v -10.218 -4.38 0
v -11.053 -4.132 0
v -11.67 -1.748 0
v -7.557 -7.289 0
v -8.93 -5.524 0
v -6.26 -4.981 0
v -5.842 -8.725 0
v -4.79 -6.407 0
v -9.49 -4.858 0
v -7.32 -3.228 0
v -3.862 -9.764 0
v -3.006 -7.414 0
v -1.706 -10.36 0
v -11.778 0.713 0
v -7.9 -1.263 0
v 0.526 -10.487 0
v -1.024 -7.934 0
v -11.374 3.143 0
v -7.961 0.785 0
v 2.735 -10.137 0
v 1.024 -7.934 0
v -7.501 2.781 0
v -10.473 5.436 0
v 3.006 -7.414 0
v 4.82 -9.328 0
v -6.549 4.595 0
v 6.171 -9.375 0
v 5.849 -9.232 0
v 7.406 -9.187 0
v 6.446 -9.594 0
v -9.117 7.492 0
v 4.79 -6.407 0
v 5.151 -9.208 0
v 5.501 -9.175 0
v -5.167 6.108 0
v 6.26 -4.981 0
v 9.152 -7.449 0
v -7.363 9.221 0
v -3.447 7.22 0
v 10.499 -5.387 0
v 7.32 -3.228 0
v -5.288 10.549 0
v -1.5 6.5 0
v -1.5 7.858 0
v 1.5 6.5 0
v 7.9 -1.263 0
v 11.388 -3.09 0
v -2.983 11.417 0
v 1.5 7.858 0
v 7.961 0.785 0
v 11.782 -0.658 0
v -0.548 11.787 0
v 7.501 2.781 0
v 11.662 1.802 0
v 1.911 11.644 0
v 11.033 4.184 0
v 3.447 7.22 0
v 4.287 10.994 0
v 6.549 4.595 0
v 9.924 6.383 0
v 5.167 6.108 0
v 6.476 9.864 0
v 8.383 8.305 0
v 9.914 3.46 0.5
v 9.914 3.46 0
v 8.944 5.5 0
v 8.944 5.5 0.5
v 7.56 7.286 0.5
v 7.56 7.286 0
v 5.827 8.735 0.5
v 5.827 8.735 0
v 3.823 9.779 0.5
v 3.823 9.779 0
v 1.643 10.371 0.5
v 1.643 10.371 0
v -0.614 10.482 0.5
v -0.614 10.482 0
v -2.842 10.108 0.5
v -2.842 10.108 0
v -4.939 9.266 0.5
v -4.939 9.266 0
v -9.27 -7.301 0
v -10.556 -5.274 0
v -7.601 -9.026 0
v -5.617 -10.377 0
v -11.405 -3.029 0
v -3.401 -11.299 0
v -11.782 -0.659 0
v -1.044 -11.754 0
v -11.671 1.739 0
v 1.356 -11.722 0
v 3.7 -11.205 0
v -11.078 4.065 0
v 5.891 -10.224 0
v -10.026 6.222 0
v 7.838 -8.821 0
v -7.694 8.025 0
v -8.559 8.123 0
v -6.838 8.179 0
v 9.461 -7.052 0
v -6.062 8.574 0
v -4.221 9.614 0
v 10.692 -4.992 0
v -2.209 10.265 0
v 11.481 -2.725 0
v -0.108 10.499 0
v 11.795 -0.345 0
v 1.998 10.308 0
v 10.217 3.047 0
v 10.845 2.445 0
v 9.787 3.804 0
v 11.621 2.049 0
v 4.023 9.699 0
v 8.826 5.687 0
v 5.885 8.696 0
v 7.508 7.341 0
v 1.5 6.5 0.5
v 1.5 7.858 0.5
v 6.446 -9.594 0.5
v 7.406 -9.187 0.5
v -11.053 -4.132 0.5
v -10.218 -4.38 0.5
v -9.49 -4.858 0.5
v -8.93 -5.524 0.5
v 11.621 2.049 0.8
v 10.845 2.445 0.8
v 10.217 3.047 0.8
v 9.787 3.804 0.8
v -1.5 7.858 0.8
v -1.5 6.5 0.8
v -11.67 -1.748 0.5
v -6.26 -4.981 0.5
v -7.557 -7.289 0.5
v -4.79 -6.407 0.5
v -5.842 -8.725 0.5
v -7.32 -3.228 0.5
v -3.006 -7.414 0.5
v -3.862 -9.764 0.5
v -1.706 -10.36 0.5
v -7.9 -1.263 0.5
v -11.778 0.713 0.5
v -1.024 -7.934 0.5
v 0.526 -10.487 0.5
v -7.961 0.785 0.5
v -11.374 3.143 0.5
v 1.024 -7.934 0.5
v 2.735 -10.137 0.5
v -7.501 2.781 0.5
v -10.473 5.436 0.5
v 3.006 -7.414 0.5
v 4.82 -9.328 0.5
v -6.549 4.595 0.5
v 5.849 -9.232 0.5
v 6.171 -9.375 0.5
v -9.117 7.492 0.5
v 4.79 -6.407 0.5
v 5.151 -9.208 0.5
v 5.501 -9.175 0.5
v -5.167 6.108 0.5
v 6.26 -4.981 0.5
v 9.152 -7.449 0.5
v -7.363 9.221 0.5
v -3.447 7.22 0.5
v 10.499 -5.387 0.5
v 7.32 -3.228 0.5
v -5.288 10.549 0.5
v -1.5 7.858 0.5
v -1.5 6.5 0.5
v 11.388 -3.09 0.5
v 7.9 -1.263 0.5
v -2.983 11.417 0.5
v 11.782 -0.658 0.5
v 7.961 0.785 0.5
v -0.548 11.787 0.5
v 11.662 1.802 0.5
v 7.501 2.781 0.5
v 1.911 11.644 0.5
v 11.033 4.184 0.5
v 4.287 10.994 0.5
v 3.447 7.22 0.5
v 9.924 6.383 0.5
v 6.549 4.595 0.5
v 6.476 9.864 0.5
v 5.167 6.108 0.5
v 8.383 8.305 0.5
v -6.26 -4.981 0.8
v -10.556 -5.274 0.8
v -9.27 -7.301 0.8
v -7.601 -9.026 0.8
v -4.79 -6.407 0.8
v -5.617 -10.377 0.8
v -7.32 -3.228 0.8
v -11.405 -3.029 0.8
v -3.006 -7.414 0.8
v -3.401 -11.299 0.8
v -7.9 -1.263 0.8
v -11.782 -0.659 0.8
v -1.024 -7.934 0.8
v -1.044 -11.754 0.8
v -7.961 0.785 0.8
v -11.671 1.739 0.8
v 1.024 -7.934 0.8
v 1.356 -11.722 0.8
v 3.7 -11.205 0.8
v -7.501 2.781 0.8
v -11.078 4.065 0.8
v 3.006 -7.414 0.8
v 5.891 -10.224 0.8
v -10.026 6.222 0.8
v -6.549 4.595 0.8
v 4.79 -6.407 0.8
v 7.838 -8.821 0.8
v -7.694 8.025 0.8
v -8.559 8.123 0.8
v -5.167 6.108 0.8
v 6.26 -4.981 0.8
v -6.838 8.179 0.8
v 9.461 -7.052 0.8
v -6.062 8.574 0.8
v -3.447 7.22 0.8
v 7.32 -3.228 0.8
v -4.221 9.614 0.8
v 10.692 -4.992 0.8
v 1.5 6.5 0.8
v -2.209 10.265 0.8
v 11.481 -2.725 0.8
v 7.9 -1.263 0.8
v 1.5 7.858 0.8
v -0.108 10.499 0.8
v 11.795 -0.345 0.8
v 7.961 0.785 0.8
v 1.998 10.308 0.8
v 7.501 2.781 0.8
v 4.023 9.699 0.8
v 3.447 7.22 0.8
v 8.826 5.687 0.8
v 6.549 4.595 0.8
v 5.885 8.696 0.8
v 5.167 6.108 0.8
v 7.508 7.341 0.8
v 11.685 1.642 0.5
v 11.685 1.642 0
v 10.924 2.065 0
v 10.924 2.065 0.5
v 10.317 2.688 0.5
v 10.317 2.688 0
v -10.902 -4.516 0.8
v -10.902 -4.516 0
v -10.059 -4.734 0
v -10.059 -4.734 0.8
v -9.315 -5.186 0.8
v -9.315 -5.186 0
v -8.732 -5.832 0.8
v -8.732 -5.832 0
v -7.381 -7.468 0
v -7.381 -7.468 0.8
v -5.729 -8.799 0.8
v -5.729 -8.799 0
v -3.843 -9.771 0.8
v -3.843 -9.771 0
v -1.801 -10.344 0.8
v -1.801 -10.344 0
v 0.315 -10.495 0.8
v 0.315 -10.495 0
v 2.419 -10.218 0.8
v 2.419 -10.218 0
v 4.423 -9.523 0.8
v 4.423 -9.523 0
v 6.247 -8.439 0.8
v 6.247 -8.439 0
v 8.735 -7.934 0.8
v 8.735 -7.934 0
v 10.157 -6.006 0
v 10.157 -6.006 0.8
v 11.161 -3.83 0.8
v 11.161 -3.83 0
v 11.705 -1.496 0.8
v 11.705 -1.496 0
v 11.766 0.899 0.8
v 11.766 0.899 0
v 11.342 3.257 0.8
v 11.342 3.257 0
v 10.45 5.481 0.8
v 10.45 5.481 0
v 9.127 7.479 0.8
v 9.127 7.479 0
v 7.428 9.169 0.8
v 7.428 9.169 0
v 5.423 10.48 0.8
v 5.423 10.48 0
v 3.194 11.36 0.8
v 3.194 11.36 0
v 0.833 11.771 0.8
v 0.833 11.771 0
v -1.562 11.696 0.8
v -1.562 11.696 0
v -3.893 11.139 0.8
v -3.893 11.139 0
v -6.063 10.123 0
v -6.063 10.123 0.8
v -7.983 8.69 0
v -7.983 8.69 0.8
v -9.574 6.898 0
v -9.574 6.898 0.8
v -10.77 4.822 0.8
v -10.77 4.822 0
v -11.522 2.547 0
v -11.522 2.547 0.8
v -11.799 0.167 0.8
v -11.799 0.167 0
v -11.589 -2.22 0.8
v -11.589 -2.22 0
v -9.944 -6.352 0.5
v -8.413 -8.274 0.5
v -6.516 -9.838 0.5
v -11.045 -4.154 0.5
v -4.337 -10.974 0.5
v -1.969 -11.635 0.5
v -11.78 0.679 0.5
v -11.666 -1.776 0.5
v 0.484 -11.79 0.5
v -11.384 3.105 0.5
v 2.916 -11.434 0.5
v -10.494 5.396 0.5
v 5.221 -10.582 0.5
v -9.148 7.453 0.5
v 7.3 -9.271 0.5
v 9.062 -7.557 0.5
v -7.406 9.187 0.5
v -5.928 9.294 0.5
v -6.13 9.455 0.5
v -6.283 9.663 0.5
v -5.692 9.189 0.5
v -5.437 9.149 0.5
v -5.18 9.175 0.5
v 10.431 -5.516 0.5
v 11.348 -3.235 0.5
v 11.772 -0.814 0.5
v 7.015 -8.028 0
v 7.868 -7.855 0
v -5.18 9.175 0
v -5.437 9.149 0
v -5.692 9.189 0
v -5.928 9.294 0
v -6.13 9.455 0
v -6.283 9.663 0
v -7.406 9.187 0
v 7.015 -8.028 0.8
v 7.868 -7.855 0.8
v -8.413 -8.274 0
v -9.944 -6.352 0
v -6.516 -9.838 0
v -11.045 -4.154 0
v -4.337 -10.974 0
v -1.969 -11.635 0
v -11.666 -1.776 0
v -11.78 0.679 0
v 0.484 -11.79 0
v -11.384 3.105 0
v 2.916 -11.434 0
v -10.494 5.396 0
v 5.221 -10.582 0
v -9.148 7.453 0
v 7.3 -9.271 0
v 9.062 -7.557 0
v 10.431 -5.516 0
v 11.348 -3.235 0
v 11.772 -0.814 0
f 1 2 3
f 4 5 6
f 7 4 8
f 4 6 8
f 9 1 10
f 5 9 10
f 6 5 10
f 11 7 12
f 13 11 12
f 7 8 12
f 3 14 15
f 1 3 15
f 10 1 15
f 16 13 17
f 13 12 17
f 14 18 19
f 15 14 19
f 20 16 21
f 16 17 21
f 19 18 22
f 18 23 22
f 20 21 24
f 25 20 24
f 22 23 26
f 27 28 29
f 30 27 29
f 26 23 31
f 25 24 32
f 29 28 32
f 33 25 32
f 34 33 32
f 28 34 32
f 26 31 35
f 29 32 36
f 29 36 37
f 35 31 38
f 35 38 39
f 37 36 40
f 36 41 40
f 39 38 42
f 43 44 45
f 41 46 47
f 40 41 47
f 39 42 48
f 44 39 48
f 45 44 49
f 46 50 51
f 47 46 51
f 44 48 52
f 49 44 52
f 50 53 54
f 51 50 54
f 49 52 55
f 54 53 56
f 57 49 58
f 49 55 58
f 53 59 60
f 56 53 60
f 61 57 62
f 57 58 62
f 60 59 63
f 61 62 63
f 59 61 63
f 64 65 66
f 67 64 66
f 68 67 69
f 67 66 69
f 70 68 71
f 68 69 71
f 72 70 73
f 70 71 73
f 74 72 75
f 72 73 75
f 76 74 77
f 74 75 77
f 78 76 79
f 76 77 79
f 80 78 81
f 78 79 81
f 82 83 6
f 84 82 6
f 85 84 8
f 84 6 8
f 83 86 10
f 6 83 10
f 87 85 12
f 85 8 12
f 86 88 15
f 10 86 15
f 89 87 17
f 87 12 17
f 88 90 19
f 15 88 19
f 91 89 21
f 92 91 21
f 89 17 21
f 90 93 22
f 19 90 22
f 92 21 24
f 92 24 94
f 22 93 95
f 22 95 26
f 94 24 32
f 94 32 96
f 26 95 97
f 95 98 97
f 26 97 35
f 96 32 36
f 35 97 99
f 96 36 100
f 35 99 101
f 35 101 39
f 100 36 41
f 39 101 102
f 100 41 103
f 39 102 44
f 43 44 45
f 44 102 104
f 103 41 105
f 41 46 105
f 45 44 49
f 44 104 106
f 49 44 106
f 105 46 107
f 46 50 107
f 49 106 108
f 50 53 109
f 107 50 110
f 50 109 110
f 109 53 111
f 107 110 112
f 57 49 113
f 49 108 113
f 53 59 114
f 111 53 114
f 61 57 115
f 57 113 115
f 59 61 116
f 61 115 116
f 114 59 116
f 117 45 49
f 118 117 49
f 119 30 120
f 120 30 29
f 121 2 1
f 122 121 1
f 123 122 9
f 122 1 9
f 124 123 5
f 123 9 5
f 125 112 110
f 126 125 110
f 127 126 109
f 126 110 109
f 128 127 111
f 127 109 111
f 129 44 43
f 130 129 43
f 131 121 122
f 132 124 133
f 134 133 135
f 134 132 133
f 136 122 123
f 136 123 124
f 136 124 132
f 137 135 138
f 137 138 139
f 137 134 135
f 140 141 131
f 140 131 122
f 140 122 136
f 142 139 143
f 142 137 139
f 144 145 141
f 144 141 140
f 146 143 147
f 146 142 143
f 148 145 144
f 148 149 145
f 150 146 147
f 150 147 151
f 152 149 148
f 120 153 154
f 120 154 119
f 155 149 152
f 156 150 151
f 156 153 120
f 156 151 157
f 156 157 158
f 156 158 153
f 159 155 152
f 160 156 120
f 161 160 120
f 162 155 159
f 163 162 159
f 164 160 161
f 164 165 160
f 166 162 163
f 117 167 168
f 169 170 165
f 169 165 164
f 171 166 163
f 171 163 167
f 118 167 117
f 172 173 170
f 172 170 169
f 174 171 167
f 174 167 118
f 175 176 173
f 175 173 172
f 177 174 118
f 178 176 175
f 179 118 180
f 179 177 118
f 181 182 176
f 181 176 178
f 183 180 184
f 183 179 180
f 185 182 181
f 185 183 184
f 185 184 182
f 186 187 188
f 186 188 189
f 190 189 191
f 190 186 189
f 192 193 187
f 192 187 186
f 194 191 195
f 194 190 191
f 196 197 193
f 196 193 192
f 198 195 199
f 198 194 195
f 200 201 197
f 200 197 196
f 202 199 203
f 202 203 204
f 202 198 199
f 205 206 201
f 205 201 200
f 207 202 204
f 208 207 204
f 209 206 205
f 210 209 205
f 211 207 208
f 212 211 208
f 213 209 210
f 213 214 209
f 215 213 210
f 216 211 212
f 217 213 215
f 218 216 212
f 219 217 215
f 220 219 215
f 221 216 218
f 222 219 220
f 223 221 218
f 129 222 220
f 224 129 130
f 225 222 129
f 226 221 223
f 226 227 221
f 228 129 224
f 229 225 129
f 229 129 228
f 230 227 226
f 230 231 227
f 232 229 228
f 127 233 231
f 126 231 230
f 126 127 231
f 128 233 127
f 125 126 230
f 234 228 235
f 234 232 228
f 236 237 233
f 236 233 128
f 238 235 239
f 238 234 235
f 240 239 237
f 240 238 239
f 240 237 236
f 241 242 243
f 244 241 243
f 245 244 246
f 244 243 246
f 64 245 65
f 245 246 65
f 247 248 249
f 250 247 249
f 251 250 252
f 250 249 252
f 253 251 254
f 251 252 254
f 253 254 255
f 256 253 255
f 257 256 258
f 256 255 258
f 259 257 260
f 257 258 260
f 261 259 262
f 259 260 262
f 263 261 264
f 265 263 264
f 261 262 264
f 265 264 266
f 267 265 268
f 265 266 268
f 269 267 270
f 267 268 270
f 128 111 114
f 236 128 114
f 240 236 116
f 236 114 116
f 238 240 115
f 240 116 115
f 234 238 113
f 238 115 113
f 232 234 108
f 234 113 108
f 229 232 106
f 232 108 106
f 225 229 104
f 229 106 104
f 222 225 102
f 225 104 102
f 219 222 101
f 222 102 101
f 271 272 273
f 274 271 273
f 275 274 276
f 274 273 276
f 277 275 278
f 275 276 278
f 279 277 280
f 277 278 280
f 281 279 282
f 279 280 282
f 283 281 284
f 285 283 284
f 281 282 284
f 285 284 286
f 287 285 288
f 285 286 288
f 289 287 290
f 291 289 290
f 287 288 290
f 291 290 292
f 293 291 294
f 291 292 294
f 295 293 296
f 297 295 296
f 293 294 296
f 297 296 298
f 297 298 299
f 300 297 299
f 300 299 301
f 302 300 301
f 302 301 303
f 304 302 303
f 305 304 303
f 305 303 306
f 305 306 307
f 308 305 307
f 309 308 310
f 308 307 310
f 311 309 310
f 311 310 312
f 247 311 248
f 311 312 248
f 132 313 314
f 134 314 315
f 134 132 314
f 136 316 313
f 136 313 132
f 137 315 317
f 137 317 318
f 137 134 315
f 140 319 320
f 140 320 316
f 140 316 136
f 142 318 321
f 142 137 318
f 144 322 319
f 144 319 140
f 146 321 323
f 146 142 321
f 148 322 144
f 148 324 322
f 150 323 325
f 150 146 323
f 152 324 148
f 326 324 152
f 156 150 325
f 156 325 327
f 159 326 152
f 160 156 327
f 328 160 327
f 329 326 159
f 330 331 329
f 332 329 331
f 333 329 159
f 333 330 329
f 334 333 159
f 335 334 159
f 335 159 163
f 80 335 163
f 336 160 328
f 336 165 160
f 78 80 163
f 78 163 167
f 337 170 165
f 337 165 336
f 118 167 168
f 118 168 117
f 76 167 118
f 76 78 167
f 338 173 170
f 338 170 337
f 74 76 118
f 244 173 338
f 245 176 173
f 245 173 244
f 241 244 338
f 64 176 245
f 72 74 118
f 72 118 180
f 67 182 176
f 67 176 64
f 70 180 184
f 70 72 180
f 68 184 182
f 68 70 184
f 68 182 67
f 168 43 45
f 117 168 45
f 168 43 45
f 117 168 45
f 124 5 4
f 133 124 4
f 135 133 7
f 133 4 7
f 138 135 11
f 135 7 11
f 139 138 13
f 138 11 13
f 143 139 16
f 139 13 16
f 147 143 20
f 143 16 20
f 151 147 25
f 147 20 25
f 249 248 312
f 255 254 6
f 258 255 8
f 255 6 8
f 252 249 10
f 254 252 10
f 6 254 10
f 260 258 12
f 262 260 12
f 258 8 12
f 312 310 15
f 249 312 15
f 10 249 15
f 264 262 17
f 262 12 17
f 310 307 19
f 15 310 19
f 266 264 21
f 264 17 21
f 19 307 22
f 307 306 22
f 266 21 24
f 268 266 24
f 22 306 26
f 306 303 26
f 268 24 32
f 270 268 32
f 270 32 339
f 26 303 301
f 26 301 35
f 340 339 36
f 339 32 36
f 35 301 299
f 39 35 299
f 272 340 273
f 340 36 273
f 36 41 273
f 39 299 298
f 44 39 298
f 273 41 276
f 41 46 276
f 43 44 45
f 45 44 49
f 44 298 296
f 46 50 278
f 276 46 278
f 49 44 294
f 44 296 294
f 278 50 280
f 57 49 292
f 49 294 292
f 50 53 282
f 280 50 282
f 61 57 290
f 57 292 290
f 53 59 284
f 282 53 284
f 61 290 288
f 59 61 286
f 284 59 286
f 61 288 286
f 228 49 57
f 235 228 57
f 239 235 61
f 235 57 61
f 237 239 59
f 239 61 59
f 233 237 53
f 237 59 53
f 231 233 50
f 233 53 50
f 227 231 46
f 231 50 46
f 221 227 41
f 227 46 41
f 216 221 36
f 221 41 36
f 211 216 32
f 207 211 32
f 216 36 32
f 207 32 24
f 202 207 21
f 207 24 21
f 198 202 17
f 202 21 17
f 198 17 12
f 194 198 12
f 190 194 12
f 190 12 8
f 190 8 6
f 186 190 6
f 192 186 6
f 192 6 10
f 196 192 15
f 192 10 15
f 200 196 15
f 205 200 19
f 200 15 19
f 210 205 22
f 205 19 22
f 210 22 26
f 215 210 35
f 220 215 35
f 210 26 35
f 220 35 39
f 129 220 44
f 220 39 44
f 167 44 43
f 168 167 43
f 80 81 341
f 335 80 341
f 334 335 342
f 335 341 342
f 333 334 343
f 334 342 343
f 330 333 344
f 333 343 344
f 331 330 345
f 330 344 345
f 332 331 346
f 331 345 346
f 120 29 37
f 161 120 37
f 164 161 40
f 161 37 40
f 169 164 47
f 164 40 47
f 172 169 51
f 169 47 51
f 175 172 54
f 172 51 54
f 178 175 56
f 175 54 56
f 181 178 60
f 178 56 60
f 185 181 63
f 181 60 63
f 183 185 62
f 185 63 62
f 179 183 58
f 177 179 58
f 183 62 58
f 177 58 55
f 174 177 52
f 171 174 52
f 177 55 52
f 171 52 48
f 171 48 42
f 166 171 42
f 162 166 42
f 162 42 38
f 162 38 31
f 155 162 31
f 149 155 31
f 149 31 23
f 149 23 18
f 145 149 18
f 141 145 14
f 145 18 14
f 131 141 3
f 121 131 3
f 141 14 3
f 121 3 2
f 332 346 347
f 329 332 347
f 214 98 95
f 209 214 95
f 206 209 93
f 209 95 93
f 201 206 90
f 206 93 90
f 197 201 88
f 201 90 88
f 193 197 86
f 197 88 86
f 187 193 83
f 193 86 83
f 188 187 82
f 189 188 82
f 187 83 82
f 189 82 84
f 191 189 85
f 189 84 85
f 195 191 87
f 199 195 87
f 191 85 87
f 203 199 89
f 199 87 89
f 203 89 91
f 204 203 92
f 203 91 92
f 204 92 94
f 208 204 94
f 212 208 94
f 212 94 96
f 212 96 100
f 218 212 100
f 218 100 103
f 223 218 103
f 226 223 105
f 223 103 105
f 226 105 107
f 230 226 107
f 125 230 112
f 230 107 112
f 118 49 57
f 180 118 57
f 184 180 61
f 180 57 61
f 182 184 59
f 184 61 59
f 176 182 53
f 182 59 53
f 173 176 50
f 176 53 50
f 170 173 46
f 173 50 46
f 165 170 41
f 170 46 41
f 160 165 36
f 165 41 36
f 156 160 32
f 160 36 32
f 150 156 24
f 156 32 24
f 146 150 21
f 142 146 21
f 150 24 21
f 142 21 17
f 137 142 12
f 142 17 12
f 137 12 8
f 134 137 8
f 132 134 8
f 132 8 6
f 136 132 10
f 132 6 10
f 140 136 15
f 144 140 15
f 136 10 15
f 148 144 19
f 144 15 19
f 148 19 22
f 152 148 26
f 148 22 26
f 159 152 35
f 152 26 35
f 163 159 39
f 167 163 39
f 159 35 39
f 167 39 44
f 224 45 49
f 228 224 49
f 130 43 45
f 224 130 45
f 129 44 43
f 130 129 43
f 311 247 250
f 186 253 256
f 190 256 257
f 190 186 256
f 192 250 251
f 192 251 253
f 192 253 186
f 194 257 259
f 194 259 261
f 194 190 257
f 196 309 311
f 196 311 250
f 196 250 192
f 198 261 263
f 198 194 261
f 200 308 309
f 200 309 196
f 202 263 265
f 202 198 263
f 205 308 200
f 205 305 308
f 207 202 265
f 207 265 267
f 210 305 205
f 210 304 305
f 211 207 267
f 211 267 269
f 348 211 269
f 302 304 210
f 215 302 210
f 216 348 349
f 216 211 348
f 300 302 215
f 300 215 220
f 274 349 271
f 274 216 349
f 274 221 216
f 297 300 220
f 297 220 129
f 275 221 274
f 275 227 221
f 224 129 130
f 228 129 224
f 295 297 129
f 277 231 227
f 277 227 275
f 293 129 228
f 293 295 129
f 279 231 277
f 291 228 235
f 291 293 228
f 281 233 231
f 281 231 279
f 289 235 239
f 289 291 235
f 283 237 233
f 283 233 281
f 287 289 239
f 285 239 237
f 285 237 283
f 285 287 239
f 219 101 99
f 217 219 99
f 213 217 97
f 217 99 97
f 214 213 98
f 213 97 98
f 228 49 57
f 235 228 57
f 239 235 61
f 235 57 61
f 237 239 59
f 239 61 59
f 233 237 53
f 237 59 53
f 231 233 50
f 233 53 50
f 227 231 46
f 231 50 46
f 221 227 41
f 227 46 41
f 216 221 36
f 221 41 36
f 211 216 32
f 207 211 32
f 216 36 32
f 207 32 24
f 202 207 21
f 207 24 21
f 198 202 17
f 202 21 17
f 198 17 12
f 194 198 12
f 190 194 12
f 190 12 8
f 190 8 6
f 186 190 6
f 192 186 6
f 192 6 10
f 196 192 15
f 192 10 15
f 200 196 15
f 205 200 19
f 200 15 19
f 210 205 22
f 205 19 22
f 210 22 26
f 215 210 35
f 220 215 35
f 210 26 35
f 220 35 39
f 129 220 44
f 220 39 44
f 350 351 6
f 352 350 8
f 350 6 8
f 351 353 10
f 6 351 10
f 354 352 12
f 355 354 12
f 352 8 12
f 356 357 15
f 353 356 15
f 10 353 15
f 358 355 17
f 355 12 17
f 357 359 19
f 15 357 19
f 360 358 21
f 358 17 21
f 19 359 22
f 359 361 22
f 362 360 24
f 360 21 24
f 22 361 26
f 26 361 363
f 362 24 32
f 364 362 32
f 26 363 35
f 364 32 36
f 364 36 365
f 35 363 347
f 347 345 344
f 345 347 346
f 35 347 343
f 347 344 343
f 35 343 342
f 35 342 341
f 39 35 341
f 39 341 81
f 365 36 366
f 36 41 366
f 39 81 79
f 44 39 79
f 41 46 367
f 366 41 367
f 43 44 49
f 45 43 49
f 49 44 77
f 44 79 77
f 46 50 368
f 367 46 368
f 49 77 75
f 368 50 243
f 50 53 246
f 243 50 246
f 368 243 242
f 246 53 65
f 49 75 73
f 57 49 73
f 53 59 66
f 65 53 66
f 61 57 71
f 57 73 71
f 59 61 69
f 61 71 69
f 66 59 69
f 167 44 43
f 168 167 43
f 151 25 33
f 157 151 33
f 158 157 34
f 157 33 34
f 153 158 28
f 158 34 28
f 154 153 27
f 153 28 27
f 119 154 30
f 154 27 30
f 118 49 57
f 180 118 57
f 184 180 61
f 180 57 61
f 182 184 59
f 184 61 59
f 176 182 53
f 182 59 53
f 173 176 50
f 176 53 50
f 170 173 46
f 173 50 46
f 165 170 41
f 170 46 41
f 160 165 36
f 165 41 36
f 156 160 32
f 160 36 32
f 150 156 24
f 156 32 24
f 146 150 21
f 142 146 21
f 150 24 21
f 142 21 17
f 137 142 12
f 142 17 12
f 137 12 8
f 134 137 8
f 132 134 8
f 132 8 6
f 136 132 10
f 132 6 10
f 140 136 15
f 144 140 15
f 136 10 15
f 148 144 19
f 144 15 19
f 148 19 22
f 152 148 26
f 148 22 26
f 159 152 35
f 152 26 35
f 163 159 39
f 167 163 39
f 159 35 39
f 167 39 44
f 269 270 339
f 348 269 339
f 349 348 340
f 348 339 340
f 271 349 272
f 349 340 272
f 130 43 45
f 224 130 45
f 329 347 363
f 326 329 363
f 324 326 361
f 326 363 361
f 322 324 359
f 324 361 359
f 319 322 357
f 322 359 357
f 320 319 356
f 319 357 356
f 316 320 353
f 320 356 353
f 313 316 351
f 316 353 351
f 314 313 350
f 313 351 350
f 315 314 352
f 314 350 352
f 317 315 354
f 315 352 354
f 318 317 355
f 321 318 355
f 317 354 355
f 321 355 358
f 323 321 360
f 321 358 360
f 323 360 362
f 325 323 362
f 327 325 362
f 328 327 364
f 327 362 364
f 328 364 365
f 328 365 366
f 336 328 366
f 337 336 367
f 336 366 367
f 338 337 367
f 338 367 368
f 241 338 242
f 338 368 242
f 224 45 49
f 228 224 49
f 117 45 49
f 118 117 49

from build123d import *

# Parameters (mm, degrees)
F1_DEPTH = 0.5
F3_DEPTH = 0.8
F5_DEPTH = 0.5
F7_DEPTH = 0.8


with BuildPart() as f1:
    # F0 (on Top) → F1 (new body)
    with BuildSketch(Plane.XY):
        with BuildLine():
            Line((6.445634, -9.594181), (7.405834, -9.1866))
            ThreePointArc((7.405834, -9.1866), (3.116261, 11.381077), (-11.052732, -4.132447))
            ThreePointArc((-11.052732, -4.132447), (-9.836876, -4.592421), (-8.929749, -5.523549))
            ThreePointArc((-8.929749, -5.523549), (-2.800136, -10.119745), (4.82027, -9.328183))
            ThreePointArc((4.82027, -9.328183), (5.676965, -9.192243), (6.445634, -9.594181))
        make_face()
        with BuildLine():
            ThreePointArc((1.5, 7.858117), (0, -8), (-1.5, 7.858117))
            Line((-1.5, 7.858117), (-1.5, 6.5))
            Line((-1.5, 6.5), (1.5, 6.5))
            Line((1.5, 6.5), (1.5, 7.858117))
        make_face(mode=Mode.SUBTRACT)
    extrude(amount=F1_DEPTH)


with BuildPart() as f3:
    # F2 (on Top) → F3 (new body)
    with BuildSketch(Plane.XY):
        with BuildLine():
            ThreePointArc((6.247244, -8.43931), (7.434829, -7.910612), (8.734574, -7.933928))
            ThreePointArc((8.734574, -7.933928), (2.023691, 11.625174), (-10.901778, -4.515665))
            ThreePointArc((-10.901778, -4.515665), (-9.670611, -4.932925), (-8.73154, -5.831828))
            ThreePointArc((-8.73154, -5.831828), (-1.800742, -10.344435), (6.247244, -8.43931))
        make_face()
        with BuildLine():
            ThreePointArc((1.5, 7.858117), (0, -8), (-1.5, 7.858117))
            Line((-1.5, 7.858117), (-1.5, 6.5))
            Line((-1.5, 6.5), (1.5, 6.5))
            Line((1.5, 6.5), (1.5, 7.858117))
        make_face(mode=Mode.SUBTRACT)
    extrude(amount=F3_DEPTH)


with BuildPart() as f5:
    # F4 (on Top) → F5 (new body)
    with BuildSketch(Plane.XY):
        with BuildLine():
            Line((-6.283247, 9.66311), (-7.405834, 9.1866))
            ThreePointArc((-7.405834, 9.1866), (-4.336761, -10.974174), (11.685163, 1.642243))
            ThreePointArc((11.685163, 1.642243), (10.597685, 2.354472), (9.913593, 3.459867))
            ThreePointArc((9.913593, 3.459867), (3.823028, 9.779287), (-4.93863, 9.266064))
            ThreePointArc((-4.93863, 9.266064), (-5.692172, 9.189484), (-6.283247, 9.66311))
        make_face()
        with BuildLine():
            ThreePointArc((1.5, 7.858117), (0, -8), (-1.5, 7.858117))
            Line((-1.5, 7.858117), (-1.5, 6.5))
            Line((-1.5, 6.5), (1.5, 6.5))
            Line((1.5, 6.5), (1.5, 7.858117))
        make_face(mode=Mode.SUBTRACT)
    extrude(amount=F5_DEPTH)


with BuildPart() as f7:
    # F6 (on Top) → F7 (new body)
    with BuildSketch(Plane.XY):
        with BuildLine():
            ThreePointArc((-6.061654, 8.573584), (-7.260491, 8.070919), (-8.559418, 8.122584))
            ThreePointArc((-8.559418, 8.122584), (-3.400716, -11.299342), (11.620731, 2.049048))
            ThreePointArc((11.620731, 2.049048), (10.509059, 2.722892), (9.786806, 3.803739))
            ThreePointArc((9.786806, 3.803739), (3.026061, 10.054499), (-6.061654, 8.573584))
        make_face()
        with BuildLine():
            ThreePointArc((1.5, 7.858117), (0, -8), (-1.5, 7.858117))
            Line((-1.5, 7.858117), (-1.5, 6.5))
            Line((-1.5, 6.5), (1.5, 6.5))
            Line((1.5, 6.5), (1.5, 7.858117))
        make_face(mode=Mode.SUBTRACT)
    extrude(amount=F7_DEPTH)


solid = Compound([f1.part, f3.part, f5.part, f7.part])
